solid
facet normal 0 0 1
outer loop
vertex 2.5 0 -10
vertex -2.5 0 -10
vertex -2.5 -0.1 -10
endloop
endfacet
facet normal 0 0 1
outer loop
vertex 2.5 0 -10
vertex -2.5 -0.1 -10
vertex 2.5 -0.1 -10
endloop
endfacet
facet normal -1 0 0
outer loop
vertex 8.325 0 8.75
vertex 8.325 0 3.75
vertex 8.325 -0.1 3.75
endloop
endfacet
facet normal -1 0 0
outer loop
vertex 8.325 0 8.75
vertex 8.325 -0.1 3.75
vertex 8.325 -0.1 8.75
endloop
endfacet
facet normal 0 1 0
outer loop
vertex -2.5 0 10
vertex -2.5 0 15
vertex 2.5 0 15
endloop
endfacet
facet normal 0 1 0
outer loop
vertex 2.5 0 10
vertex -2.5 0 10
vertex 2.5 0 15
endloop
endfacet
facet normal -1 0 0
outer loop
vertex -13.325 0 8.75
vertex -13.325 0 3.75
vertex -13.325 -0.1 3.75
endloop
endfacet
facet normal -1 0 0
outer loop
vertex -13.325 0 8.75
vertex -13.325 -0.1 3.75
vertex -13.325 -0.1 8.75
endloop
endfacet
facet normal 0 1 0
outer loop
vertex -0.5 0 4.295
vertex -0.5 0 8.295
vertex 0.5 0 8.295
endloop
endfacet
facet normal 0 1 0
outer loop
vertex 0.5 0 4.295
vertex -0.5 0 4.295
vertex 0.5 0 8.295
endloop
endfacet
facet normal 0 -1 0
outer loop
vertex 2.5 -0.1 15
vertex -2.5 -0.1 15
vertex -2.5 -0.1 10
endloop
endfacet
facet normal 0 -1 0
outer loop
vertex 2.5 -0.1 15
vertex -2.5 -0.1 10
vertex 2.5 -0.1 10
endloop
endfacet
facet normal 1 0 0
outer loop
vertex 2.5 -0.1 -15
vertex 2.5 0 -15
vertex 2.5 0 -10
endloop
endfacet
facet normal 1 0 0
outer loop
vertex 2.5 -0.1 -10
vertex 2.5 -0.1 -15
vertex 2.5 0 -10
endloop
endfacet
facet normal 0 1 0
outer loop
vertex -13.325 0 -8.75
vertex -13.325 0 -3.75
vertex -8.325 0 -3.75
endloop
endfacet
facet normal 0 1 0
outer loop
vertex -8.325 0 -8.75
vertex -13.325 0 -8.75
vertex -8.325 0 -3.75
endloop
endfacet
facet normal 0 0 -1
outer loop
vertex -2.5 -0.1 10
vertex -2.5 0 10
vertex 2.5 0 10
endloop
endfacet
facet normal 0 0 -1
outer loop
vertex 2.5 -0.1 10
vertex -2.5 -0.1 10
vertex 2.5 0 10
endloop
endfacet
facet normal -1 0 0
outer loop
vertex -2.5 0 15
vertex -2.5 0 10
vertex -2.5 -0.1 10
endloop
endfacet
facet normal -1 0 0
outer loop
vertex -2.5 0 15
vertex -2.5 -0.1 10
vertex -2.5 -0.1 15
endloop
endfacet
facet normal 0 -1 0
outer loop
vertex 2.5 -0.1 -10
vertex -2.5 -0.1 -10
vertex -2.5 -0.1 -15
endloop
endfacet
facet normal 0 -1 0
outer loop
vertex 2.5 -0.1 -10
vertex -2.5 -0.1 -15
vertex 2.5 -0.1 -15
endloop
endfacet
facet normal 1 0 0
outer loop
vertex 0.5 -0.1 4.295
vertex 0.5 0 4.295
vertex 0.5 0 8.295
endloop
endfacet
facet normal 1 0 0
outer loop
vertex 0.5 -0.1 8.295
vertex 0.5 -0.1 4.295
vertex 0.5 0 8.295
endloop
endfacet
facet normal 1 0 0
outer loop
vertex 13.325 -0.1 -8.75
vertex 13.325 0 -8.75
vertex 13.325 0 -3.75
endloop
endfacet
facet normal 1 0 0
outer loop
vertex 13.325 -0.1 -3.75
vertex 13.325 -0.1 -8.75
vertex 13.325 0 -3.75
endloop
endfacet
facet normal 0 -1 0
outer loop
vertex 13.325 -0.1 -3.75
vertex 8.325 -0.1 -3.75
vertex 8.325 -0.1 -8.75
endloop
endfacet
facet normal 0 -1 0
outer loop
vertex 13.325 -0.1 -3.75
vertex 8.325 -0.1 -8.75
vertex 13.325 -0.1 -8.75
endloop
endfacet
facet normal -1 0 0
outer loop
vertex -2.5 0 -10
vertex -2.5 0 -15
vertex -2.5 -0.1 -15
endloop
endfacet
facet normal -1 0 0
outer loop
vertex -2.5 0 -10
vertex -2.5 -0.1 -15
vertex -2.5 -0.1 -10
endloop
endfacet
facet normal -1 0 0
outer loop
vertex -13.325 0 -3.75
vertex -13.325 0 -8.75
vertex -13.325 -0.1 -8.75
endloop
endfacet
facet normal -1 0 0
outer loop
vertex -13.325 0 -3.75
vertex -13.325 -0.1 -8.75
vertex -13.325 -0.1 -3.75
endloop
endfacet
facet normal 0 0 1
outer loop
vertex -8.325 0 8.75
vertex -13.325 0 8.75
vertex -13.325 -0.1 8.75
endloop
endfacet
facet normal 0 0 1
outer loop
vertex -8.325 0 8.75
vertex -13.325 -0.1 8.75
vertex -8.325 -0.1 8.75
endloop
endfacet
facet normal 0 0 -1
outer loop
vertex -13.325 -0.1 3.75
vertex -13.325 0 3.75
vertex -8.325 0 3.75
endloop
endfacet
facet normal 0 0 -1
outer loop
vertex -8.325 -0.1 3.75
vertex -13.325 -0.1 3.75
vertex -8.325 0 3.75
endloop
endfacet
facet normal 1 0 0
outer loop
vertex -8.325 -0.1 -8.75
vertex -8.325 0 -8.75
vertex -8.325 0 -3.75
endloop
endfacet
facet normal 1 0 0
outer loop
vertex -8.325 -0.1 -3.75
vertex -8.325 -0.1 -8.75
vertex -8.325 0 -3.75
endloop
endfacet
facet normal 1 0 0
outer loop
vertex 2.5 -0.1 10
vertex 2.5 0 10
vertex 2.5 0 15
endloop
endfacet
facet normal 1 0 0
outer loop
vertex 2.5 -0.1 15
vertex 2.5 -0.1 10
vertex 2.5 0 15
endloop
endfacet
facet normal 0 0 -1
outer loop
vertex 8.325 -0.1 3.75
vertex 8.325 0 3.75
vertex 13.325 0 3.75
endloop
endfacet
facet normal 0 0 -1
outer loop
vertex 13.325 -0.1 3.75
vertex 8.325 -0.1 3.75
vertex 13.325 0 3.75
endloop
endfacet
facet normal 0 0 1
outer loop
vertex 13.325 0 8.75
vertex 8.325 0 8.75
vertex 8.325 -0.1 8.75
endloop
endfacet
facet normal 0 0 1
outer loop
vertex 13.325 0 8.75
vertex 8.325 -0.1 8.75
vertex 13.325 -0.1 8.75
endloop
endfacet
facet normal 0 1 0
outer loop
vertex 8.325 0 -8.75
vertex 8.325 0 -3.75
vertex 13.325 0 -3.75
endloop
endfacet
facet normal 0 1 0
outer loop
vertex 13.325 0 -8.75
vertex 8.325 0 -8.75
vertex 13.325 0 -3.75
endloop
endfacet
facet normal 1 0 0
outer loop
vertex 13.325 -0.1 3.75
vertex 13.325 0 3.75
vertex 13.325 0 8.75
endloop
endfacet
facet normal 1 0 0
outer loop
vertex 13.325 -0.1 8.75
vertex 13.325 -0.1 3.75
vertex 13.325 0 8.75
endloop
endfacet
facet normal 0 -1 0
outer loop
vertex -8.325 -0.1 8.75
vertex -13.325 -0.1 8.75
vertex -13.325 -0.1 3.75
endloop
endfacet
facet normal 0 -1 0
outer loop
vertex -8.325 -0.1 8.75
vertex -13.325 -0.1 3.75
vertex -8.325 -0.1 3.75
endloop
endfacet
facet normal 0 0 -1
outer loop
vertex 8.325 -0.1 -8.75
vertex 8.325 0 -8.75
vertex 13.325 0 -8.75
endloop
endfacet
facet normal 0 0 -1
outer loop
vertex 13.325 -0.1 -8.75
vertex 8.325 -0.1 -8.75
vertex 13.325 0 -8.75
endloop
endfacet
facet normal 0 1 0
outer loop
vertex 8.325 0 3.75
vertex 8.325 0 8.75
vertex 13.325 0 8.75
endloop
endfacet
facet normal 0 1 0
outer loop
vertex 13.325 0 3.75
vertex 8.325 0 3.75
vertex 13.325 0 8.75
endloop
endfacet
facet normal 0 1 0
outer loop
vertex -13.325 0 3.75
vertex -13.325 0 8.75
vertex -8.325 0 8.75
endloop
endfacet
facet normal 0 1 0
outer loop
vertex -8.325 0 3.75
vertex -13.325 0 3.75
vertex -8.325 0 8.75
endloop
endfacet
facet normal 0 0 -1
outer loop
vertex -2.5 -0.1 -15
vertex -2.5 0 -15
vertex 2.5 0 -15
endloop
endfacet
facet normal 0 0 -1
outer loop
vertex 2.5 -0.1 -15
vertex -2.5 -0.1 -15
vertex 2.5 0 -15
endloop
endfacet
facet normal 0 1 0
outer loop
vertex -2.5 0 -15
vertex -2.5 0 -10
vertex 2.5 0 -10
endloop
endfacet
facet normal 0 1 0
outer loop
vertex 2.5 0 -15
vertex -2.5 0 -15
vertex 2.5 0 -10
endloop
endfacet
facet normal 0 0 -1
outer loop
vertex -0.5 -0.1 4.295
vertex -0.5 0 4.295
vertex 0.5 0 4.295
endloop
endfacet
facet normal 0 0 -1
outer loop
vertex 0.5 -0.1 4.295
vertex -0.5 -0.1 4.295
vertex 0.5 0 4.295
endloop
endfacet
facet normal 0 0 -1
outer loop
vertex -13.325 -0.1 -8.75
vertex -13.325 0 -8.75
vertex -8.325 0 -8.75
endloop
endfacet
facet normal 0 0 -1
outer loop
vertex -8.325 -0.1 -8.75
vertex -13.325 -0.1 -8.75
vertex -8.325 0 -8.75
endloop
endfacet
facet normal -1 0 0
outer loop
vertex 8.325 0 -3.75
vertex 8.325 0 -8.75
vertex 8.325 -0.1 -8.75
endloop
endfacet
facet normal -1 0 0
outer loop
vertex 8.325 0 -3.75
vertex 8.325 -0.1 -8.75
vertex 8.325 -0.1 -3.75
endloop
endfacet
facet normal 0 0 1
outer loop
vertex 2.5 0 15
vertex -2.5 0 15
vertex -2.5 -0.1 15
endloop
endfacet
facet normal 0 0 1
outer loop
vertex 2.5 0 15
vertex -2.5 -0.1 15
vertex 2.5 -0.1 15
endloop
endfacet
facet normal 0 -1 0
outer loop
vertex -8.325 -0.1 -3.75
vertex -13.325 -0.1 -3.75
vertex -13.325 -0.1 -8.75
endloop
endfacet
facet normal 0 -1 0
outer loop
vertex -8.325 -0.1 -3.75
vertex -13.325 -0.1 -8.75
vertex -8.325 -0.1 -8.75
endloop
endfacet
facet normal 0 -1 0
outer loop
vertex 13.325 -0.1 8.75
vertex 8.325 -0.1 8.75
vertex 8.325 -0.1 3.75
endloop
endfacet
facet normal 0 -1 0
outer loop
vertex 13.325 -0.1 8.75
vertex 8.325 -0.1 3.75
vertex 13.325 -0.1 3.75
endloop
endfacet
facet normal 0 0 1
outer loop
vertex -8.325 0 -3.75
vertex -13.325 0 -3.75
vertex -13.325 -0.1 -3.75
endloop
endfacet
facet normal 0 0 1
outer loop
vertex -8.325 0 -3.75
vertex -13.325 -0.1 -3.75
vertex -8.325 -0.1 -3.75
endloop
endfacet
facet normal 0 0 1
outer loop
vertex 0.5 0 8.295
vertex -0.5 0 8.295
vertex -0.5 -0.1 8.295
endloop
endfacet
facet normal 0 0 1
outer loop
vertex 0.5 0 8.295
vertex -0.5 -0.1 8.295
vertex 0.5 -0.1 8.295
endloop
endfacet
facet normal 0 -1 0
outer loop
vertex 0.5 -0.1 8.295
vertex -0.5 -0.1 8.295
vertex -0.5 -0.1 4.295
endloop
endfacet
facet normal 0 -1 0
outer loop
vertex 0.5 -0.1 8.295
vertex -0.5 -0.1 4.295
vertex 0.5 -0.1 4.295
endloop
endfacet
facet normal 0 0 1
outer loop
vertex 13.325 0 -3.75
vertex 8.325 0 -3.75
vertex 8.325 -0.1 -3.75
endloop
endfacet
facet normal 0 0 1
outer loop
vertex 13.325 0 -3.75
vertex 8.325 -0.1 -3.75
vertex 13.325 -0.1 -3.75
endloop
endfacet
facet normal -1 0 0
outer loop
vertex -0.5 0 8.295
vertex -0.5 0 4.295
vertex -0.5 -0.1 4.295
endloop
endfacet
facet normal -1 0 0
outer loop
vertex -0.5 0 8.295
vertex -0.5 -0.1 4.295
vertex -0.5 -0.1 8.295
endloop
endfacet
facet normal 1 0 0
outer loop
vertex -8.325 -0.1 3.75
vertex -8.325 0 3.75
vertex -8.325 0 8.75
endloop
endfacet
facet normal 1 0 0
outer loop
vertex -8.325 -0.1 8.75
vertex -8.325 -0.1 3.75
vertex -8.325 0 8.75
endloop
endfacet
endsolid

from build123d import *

# Parameters (mm, degrees)
F0_W     = 5
F0_H     = 5
F0_W_2   = 1
F0_H_2   = 4
F1_DEPTH = 0.1


with BuildPart() as f1:
    # F0 (on Front) → F1 (new body)
    with BuildSketch(Plane.XZ):
        with Locations((0, 12.5)):
            Rectangle(F0_W, F0_H)
        with Locations((10.825318, 6.25)):
            Rectangle(F0_W, F0_H)
        with Locations((10.825318, -6.25)):
            Rectangle(F0_W, F0_H)
        with Locations((0, -12.5)):
            Rectangle(F0_W, F0_H)
        with Locations((-10.825318, -6.25)):
            Rectangle(F0_W, F0_H)
        with Locations((-10.825318, 6.25)):
            Rectangle(F0_W, F0_H)
        with Locations((0, 6.295396)):
            Rectangle(F0_W_2, F0_H_2)
    extrude(amount=F1_DEPTH)


solid = f1.part
